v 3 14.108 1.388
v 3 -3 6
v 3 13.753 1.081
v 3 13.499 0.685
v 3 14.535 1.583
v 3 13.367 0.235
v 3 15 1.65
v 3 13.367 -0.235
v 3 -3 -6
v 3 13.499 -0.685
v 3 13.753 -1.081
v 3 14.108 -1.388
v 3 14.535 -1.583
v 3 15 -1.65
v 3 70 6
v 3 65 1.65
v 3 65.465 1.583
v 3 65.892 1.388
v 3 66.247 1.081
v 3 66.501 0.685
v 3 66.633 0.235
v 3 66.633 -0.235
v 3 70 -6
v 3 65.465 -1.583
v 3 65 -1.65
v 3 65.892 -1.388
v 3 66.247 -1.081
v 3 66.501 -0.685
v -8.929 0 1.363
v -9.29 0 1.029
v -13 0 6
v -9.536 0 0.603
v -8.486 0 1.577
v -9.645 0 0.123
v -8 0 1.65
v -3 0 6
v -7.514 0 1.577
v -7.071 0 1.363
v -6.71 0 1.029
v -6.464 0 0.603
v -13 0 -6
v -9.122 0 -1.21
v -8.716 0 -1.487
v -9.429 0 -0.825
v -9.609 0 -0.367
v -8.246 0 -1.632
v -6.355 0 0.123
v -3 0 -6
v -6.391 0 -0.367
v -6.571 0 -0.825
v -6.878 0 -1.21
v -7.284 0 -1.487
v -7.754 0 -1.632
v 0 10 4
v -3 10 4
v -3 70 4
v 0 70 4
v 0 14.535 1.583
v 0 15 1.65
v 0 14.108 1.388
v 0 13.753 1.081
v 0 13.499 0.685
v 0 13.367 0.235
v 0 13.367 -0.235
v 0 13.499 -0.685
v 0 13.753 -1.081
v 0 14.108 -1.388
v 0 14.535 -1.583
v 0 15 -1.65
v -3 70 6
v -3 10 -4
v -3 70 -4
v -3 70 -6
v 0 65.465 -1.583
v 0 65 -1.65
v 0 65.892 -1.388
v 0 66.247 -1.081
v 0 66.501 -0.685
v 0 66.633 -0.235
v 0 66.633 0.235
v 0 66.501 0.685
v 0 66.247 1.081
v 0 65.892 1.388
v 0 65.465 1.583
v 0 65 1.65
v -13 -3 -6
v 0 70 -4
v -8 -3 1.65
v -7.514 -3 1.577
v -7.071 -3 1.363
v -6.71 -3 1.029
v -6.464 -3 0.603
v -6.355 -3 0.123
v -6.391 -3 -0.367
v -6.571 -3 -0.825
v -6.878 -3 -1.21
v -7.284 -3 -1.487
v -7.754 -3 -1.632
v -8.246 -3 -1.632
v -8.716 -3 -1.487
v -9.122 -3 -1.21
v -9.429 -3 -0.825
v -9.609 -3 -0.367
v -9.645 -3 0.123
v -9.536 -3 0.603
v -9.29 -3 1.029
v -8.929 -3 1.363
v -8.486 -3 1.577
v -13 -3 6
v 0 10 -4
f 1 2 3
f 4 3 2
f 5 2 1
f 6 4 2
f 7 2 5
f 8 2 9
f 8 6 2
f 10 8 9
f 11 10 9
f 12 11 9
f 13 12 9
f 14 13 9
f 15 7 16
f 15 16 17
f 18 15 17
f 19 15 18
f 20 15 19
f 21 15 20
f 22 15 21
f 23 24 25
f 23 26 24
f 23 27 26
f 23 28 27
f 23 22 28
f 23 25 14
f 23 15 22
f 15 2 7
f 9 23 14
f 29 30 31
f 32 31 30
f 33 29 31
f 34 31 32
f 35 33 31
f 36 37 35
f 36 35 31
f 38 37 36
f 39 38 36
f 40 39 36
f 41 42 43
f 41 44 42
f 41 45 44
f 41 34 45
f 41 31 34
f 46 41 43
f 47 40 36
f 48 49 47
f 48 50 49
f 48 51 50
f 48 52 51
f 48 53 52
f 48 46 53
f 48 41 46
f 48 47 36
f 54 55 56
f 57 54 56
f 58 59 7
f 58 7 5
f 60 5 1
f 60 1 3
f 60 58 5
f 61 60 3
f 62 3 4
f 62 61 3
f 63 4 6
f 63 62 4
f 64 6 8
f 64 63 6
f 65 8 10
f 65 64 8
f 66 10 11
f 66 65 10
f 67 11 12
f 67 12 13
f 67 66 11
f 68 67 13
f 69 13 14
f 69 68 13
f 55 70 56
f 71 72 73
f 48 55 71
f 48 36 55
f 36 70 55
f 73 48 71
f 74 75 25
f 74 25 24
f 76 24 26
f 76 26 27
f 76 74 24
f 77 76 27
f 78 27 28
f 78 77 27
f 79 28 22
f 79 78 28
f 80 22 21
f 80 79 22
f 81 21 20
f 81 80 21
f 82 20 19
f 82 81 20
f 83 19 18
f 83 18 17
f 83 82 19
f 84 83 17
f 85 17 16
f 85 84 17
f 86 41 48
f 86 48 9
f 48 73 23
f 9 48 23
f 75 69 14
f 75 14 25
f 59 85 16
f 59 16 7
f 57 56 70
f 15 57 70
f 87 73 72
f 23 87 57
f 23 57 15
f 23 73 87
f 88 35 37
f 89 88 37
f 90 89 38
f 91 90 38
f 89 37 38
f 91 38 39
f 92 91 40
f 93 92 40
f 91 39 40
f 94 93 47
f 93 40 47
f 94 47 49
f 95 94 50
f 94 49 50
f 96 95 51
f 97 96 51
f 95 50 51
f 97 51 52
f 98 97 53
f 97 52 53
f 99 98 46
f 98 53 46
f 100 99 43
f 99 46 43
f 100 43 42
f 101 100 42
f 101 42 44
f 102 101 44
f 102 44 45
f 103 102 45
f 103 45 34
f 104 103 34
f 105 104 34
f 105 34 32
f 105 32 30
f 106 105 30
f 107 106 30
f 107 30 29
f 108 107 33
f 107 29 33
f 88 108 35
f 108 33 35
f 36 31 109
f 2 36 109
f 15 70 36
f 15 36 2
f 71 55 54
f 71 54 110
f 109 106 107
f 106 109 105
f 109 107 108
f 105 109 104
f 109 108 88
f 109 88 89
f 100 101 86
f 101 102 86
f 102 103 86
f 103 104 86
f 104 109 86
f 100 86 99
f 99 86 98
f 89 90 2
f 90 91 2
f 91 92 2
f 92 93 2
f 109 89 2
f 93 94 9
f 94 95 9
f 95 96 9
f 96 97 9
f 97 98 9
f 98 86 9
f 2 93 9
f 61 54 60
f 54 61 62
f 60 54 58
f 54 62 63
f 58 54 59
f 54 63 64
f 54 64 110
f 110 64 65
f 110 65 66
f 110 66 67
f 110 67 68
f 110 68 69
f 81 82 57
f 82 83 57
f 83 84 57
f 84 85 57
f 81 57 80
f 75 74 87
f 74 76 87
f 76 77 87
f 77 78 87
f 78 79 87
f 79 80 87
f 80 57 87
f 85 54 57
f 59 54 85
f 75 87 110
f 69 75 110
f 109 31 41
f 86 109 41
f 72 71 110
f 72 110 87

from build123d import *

# Parameters (mm, degrees)
SKETCH_1_W          = 6
SKETCH_1_H          = 12
EXTRUDE_1_DEPTH     = 70
SKETCH_2_W          = 16
SKETCH_2_H          = 12
EXTRUDE_2_DEPTH     = 3
SKETCH_3_R          = 1.65
CUT_EXTRUDE_1_DEPTH = 3
SKETCH_4_W          = 8
SKETCH_4_H          = 60
CUT_EXTRUDE_2_DEPTH = 3
CUT_EXTRUDE_3_DEPTH = 3


with BuildPart() as part:
    # 草图1 → 凸台-拉伸1 (new body)
    with BuildSketch(Plane(origin=(0, 0, 0), x_dir=(1, 0, 0), z_dir=(0, 1, 0))):
        Rectangle(SKETCH_1_W, SKETCH_1_H)
    extrude(amount=EXTRUDE_1_DEPTH)

    # 草图2 → 凸台-拉伸2 (add)
    with BuildSketch(Plane(origin=(0, 0, 0), x_dir=(1, 0, 0), z_dir=(0, 1, 0))):
        with Locations((-5, 0)):
            Rectangle(SKETCH_2_W, SKETCH_2_H)
    extrude(amount=-EXTRUDE_2_DEPTH)

    # 草图3 → 切除-拉伸1 (cut)
    with BuildSketch(Plane(origin=(0, 0, 0), x_dir=(1, 0, 0), z_dir=(0, 1, 0))):
        with Locations(Location((-8, 0, 0), (0, 0, 270))):
            Circle(SKETCH_3_R)
    extrude(amount=-CUT_EXTRUDE_1_DEPTH, mode=Mode.SUBTRACT)

    # 草图4 → 切除-拉伸2 (cut)
    with BuildSketch(Plane(origin=(-3, 0, 0), x_dir=(0, 0, -1), z_dir=(1, 0, 0))):
        with Locations((0, 40)):
            Rectangle(SKETCH_4_W, SKETCH_4_H)
    extrude(amount=CUT_EXTRUDE_2_DEPTH, mode=Mode.SUBTRACT)

    # 草图5 → 切除-拉伸3 (cut)
    with BuildSketch(Plane.ZY):
        with BuildLine():
            Line((1.65, 65), (1.65, 15))
            ThreePointArc((1.65, 15), (0, 13.35), (-1.65, 15))
            Line((-1.65, 15), (-1.65, 65))
            ThreePointArc((-1.65, 65), (0, 66.65), (1.65, 65))
        make_face()
    extrude(amount=-CUT_EXTRUDE_3_DEPTH, mode=Mode.SUBTRACT)


solid = part.part
